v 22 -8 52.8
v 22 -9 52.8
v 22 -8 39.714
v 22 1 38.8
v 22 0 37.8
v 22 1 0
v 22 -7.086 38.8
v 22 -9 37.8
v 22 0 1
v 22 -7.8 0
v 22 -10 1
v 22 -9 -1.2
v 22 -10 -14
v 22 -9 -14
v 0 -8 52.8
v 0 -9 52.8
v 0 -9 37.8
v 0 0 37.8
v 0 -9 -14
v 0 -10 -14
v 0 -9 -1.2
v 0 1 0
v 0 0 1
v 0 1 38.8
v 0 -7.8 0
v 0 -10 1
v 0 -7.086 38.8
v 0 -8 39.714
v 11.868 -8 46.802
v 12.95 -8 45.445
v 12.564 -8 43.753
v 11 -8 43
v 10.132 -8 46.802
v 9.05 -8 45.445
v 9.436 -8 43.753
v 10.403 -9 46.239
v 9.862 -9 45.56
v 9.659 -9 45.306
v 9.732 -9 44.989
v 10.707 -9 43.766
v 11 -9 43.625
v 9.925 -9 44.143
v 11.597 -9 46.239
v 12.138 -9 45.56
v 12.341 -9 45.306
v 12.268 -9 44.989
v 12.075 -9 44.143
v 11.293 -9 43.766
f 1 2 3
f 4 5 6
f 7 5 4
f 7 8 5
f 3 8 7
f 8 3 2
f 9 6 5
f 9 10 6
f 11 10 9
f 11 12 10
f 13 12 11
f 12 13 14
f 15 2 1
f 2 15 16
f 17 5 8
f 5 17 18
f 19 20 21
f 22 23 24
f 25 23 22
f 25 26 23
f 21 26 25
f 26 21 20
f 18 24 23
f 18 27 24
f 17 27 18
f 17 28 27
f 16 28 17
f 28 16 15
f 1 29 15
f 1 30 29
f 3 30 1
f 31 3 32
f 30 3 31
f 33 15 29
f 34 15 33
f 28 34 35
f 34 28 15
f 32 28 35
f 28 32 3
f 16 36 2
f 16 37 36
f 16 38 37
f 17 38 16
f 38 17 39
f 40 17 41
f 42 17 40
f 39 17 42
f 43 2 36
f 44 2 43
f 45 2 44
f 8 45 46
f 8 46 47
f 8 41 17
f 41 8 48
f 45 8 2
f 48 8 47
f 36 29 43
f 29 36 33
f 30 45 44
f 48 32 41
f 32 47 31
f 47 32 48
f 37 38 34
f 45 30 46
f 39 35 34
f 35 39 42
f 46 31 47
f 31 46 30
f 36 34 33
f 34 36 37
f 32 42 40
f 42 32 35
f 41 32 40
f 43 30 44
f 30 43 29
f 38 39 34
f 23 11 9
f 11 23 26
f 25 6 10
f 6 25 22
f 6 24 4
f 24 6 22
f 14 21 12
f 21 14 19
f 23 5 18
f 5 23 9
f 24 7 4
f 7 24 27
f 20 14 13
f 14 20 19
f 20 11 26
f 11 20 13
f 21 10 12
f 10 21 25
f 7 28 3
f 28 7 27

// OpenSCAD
width = 22;

// Bottom Horizontal

translate([0,-9,0])
cube([width, 10, 1]);

// Tall vertical

cube([width, 1, 37.8]);

// Top Horizontal

translate([0,-9,37.8])
cube([width, 10, 1]);

// Mount with screw-hole

difference() {
    translate([0,-9,37.8])
    cube([width, 1, 15]);
    translate([11,-8,45])
    rotate([90, 90, 0])
    cylinder(h=2, r1=2, r2=.75);
}

// Mount without screw-hole

translate([0,-10,-14])
cube([width, 1, 15]);

// Corner supports

translate([0,-9,-1.2])
rotate([45, 0, 0])
cube([width, 2, 1]);

translate([0,-9,39.3])
rotate([-45, 0, 0])
cube([width, 2, 1]);
